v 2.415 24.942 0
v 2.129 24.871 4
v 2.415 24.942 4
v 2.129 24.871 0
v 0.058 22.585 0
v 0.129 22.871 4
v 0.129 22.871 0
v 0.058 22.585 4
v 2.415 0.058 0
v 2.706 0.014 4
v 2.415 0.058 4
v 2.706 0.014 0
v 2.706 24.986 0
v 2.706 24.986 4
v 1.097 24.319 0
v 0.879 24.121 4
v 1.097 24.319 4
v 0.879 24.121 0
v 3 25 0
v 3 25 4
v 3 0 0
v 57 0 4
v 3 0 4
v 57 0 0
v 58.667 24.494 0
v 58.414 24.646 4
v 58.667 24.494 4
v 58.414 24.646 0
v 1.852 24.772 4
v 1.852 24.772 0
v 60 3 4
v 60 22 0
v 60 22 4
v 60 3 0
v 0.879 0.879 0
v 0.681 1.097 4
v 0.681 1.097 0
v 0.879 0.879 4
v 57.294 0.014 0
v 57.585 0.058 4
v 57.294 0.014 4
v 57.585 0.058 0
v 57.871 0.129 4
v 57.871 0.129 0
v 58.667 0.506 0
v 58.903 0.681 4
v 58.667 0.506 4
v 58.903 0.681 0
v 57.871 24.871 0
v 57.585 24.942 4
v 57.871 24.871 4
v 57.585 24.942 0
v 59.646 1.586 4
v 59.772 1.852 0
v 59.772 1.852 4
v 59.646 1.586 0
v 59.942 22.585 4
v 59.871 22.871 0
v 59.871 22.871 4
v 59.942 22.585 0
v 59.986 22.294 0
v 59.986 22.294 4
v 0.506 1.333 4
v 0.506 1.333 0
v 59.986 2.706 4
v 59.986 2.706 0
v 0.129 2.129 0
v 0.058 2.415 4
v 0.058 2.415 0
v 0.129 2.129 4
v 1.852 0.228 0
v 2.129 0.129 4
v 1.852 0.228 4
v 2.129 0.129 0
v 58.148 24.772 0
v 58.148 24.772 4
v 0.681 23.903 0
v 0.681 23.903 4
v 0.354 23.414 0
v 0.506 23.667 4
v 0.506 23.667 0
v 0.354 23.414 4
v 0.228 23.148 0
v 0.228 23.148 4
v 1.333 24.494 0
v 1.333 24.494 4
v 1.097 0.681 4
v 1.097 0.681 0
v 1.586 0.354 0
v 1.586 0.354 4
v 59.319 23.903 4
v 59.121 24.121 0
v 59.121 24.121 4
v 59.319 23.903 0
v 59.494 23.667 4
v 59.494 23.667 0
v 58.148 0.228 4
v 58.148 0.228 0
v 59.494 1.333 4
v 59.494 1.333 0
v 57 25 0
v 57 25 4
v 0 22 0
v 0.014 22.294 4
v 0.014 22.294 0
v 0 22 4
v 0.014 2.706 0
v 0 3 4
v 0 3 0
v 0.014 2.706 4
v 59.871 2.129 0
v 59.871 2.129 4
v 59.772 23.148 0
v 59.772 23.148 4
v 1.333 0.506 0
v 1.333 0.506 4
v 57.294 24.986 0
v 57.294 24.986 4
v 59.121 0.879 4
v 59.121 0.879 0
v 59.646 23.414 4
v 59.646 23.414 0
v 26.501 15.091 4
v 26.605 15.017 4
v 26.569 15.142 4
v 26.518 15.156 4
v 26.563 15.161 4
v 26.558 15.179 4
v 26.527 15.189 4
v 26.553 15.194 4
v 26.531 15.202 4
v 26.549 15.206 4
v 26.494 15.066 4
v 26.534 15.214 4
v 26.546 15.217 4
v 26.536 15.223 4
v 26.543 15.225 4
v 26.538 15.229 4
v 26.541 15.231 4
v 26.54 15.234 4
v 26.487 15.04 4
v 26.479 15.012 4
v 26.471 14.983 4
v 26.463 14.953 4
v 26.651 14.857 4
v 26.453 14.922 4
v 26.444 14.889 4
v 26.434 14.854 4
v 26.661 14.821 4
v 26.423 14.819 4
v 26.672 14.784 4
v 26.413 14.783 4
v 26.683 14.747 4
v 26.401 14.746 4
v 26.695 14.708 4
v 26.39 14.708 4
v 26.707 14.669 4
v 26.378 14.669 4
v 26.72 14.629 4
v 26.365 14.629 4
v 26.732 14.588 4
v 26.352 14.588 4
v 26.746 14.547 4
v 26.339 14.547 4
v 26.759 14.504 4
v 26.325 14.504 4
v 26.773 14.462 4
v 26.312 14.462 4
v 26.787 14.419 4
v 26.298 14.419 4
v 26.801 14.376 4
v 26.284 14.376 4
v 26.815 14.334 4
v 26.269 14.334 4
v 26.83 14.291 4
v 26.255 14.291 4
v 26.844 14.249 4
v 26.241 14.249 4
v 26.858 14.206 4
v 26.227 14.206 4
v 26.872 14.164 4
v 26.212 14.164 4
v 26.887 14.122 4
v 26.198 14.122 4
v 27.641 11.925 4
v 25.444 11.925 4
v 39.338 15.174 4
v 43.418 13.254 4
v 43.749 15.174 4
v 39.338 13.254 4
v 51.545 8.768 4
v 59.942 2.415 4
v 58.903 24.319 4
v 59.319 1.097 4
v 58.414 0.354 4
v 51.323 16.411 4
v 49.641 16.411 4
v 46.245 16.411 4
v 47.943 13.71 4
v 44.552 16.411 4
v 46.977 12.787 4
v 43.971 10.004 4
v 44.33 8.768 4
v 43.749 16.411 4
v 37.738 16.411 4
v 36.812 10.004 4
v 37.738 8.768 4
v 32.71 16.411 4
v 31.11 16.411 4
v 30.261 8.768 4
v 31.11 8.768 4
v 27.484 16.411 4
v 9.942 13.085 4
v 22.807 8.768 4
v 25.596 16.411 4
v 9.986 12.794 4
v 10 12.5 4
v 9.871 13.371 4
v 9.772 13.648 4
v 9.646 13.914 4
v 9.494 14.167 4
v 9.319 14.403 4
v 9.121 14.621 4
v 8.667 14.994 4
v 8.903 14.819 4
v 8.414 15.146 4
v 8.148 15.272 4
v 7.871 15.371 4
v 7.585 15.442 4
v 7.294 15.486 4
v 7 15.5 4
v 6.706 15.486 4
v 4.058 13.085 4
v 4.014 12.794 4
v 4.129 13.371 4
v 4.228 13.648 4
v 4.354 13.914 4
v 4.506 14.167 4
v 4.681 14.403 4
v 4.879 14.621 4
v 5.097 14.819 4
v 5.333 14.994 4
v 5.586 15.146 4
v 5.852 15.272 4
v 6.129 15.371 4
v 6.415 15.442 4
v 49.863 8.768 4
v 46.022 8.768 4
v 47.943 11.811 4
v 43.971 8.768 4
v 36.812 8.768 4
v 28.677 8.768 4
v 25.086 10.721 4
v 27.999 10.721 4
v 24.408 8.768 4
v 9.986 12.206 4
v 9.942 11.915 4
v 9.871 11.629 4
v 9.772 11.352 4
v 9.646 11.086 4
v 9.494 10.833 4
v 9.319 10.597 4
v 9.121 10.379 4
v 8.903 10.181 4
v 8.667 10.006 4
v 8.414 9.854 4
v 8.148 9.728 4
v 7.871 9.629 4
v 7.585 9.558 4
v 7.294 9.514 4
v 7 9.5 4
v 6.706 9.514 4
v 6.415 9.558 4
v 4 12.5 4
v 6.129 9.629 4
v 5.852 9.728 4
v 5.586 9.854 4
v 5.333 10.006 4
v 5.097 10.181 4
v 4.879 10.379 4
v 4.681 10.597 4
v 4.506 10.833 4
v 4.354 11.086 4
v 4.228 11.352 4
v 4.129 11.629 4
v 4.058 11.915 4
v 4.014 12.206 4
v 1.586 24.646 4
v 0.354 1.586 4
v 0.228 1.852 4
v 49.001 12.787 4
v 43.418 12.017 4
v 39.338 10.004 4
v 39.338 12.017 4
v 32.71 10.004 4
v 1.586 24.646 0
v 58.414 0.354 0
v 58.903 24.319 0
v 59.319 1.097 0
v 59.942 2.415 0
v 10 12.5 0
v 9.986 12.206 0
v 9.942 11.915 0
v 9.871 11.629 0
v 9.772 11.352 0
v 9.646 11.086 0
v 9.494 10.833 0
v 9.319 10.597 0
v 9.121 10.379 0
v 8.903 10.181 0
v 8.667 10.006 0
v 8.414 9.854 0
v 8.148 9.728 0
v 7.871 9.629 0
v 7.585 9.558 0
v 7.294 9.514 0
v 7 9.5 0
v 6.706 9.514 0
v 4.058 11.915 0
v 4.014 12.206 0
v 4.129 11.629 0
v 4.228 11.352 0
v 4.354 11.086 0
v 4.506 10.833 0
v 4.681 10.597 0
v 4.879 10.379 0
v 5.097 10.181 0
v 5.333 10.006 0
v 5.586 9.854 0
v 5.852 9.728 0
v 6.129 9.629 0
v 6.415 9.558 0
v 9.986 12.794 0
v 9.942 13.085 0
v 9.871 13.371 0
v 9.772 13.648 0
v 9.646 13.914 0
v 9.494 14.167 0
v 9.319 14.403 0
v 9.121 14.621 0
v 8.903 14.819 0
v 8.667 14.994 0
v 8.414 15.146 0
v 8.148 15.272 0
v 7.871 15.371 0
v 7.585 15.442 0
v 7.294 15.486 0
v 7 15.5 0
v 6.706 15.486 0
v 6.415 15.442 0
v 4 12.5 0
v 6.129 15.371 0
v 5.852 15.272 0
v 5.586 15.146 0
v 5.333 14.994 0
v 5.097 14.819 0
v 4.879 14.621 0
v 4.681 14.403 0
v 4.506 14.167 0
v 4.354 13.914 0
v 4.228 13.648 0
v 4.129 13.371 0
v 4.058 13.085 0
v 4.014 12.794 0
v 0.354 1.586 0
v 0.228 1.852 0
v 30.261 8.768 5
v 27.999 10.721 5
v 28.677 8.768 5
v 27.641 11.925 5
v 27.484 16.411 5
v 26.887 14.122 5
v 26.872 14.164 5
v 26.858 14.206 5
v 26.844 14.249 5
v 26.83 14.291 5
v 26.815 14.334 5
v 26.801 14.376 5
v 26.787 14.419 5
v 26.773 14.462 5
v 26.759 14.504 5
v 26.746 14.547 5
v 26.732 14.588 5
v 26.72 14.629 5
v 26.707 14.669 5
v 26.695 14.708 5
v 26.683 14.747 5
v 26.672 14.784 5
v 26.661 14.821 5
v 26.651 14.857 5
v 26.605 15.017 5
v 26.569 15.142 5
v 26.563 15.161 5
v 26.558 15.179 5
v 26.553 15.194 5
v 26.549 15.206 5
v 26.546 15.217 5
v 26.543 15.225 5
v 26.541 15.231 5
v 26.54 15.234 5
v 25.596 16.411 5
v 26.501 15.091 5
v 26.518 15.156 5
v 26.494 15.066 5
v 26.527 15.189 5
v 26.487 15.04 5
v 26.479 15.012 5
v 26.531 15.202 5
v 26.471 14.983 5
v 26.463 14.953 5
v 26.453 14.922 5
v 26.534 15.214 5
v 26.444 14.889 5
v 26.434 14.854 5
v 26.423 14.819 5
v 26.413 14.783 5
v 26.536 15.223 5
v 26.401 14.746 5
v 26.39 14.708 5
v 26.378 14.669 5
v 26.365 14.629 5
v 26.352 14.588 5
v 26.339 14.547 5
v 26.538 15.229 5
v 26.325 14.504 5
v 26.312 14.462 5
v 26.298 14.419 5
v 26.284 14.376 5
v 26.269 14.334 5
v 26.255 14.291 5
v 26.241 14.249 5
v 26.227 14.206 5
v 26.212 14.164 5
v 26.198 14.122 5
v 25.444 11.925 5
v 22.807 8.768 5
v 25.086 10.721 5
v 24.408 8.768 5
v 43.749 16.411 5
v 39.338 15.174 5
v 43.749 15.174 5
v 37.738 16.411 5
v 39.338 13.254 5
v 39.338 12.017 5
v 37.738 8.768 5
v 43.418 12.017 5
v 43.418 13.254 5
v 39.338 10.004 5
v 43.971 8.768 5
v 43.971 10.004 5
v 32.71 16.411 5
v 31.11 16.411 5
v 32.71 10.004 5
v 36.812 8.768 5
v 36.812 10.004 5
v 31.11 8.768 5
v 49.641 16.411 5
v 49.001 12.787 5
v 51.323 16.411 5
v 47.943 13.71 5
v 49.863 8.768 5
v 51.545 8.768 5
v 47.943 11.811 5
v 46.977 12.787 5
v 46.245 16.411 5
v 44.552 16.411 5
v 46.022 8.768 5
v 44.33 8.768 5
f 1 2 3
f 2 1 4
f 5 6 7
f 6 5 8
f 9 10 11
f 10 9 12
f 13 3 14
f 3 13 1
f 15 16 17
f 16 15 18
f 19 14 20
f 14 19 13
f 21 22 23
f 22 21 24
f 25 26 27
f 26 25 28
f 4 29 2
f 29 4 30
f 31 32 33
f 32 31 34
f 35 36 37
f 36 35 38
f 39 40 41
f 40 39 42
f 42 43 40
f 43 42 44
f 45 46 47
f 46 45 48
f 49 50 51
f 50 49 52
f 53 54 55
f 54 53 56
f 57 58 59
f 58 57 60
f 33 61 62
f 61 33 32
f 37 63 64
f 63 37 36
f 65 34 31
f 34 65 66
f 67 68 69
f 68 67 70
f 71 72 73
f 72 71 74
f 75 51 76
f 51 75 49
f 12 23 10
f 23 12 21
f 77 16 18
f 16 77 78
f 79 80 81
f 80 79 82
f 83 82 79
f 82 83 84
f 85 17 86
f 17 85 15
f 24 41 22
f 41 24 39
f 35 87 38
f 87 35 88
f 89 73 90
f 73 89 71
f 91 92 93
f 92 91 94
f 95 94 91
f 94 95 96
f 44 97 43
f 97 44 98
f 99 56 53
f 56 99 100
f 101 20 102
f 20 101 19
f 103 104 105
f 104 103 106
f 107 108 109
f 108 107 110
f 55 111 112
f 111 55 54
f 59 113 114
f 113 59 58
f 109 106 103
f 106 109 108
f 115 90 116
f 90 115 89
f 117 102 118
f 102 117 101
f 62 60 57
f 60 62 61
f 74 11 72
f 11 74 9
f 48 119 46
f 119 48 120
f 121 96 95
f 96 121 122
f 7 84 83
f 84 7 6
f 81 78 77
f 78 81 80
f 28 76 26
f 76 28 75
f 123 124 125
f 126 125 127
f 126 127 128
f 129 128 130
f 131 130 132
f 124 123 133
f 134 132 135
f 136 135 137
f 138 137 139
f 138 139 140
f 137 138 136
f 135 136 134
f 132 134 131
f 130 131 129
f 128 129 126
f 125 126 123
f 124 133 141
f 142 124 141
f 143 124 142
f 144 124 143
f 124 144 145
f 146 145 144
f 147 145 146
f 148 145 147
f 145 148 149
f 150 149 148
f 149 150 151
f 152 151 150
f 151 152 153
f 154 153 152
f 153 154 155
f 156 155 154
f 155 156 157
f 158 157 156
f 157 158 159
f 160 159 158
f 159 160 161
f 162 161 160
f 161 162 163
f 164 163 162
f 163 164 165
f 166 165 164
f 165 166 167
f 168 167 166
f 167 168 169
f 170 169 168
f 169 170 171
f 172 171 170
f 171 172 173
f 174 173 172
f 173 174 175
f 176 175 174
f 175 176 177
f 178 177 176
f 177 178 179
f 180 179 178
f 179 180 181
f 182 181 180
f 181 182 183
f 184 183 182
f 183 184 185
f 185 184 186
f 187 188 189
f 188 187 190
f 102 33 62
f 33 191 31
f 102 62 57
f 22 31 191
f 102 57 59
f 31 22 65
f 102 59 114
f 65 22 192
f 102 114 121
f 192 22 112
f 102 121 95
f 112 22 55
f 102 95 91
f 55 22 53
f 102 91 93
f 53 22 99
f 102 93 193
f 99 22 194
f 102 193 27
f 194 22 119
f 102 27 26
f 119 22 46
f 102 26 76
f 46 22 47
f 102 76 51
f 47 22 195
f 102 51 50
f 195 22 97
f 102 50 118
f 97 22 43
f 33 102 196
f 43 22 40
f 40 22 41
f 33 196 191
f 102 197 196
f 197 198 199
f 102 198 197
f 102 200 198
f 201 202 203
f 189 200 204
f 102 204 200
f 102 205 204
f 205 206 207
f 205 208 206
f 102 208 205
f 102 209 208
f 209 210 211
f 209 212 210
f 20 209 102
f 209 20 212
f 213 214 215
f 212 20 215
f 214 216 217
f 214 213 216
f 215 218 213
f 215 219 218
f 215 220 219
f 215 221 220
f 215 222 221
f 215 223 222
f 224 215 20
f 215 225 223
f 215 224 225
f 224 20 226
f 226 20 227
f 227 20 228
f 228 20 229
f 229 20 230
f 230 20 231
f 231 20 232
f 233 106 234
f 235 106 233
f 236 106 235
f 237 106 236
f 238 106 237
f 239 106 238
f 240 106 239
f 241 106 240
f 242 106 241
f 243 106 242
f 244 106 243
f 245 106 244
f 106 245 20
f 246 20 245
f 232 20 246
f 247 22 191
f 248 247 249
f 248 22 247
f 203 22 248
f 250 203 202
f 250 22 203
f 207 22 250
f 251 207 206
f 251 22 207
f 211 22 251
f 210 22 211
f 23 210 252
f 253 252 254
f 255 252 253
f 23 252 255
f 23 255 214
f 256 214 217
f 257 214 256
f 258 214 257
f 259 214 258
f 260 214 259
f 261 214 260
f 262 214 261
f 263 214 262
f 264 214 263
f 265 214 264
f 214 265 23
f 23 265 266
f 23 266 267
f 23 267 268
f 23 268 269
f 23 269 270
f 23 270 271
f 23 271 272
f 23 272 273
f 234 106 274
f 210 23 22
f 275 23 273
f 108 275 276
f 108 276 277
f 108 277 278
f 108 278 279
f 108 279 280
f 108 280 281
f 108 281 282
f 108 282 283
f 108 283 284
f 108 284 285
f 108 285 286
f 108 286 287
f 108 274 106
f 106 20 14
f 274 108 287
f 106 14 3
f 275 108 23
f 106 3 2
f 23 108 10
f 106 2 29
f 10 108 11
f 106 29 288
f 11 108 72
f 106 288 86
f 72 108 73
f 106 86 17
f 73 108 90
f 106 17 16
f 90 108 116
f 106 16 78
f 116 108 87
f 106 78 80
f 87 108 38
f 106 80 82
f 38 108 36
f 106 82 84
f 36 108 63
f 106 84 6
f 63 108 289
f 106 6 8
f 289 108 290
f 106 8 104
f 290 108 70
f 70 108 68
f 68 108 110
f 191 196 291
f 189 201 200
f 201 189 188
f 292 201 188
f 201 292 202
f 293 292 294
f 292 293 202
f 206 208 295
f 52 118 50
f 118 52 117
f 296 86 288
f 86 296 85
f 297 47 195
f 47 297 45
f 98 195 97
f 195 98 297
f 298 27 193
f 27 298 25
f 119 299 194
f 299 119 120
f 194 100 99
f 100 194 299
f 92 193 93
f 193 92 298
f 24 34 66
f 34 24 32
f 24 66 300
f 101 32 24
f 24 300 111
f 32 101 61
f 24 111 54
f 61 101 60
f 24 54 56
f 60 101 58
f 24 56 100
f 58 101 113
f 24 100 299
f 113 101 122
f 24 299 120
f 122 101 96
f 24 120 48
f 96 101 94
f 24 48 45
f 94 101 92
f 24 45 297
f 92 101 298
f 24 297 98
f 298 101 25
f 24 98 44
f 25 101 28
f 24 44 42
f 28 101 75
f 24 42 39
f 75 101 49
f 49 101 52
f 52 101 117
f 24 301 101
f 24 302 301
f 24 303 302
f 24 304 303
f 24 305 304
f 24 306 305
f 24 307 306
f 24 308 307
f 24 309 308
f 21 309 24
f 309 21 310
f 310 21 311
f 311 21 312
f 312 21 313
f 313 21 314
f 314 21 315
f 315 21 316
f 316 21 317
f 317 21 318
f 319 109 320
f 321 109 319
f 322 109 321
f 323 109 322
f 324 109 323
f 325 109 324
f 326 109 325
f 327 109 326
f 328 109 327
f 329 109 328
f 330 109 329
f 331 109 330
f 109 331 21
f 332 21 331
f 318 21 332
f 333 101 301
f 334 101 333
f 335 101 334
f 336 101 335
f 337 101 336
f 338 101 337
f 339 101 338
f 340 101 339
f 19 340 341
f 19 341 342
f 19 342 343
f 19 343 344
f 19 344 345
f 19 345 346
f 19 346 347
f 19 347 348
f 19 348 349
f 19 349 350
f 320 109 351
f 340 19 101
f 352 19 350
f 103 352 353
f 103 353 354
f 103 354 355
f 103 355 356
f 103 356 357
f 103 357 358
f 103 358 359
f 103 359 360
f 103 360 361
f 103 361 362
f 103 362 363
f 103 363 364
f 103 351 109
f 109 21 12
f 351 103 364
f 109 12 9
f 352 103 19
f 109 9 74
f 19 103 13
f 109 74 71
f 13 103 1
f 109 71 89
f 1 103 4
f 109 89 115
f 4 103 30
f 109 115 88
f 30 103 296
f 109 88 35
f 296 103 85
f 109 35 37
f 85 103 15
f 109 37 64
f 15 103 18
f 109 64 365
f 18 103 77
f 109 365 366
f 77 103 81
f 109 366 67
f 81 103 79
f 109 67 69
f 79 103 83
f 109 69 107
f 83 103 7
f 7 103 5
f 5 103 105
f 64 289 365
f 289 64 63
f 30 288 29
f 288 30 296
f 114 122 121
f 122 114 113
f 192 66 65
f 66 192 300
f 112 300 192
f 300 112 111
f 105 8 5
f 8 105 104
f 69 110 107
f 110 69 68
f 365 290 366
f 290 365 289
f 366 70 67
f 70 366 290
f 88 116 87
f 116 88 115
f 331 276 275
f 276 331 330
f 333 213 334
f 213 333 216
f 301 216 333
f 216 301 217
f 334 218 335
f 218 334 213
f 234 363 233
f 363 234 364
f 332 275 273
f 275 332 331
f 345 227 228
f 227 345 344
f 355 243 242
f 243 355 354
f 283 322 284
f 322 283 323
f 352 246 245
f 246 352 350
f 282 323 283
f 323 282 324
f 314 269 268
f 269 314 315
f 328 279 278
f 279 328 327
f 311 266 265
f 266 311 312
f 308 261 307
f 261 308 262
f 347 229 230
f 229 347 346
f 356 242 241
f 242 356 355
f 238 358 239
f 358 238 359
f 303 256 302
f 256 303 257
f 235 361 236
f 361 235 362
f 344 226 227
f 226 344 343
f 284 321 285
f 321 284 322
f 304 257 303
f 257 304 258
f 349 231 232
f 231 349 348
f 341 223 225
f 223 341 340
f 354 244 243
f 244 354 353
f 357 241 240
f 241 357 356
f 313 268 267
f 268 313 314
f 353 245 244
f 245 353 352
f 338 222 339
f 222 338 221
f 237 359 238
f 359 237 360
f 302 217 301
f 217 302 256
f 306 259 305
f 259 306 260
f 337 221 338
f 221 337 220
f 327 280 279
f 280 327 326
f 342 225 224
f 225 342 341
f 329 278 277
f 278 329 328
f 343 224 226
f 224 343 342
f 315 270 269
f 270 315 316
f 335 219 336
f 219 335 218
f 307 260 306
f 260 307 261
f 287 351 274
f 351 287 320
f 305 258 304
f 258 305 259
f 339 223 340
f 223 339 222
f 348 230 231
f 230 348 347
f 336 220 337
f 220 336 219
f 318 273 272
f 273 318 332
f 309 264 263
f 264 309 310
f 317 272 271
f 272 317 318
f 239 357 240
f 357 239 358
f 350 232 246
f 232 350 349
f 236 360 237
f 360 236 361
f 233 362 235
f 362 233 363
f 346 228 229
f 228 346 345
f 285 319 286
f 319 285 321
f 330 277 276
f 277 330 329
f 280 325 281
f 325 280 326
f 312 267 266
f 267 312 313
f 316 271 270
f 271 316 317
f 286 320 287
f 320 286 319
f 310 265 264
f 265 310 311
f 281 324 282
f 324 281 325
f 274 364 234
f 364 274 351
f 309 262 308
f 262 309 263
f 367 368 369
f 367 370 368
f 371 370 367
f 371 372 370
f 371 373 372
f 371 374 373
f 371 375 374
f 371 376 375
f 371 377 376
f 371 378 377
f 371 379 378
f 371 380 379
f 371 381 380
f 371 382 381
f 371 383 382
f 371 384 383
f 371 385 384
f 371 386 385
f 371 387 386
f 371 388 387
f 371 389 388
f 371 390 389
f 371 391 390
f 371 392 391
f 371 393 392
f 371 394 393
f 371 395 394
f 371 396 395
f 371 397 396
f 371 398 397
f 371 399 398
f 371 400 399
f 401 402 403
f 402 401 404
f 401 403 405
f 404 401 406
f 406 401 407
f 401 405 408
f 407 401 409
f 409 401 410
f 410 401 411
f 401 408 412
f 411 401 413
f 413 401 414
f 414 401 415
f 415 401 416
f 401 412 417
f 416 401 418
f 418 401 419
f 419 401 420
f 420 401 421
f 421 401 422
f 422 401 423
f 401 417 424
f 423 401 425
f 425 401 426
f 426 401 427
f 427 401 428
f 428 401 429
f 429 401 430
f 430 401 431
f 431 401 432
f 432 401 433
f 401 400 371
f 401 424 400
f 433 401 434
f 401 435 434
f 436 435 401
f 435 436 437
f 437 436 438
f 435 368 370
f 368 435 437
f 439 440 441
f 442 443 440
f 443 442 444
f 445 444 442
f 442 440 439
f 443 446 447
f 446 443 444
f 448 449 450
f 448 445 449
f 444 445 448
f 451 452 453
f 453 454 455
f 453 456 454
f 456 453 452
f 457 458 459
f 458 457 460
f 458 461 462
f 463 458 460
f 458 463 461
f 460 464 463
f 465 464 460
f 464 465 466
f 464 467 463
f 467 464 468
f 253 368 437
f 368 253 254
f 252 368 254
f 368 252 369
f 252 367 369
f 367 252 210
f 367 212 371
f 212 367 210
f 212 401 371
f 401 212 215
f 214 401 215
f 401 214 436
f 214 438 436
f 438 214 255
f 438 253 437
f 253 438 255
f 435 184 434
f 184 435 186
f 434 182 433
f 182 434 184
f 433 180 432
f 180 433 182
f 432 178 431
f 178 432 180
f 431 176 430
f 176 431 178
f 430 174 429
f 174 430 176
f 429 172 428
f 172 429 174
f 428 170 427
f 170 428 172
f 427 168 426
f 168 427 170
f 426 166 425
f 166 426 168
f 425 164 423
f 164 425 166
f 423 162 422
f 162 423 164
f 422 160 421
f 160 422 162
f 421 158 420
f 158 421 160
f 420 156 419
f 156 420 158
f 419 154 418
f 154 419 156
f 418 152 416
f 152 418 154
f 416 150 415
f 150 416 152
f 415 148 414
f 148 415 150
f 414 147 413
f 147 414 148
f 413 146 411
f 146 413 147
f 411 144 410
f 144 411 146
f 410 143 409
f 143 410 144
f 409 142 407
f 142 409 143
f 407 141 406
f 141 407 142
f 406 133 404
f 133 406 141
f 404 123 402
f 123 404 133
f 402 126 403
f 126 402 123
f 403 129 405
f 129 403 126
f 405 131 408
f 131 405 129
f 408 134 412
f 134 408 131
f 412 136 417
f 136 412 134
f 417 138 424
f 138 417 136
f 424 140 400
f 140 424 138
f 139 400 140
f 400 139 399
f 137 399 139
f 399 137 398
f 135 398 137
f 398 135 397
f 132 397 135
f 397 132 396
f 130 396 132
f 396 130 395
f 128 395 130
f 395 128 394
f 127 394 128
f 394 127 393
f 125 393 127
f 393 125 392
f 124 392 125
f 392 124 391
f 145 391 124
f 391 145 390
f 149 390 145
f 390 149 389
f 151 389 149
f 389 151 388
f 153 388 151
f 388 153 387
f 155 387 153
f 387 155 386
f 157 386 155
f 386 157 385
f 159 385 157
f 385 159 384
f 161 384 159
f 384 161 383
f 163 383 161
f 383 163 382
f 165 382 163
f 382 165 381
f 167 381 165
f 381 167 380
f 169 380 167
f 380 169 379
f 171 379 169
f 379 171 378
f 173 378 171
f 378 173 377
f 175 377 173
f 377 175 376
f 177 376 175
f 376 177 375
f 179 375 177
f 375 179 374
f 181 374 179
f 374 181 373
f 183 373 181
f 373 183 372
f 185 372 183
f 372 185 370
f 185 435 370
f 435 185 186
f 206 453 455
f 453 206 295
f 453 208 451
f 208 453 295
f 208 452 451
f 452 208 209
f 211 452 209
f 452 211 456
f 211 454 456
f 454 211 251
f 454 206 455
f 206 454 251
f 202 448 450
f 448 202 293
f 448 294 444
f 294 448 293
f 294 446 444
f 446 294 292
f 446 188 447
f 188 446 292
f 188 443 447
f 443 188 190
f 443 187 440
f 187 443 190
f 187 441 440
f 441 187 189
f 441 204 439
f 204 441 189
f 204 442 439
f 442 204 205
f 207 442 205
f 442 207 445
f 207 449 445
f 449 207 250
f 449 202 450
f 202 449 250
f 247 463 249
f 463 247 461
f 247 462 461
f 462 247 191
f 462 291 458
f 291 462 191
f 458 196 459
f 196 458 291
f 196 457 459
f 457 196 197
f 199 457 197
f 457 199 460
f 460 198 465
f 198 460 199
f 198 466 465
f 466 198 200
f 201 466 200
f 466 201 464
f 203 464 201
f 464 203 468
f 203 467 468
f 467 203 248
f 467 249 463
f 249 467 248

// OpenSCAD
// DP-03 · Identificador de mochila 60 x 25 x 4 mm
// Diseño e Impresión 3D en el aula · Pablo Moraga · CC BY-NC-ND 4.0
$fn = 64;
difference() {
  hull() for (x = [3, 57], y = [3, 22]) translate([x, y, 0]) cylinder(r = 3, h = 4);
  translate([7, 12.5, -1]) cylinder(d = 6, h = 6);
}
translate([37, 12.5, 4]) linear_extrude(1) text("ALEX", size = 8, halign = "center", valign = "center", font = "Liberation Sans:style=Bold");
